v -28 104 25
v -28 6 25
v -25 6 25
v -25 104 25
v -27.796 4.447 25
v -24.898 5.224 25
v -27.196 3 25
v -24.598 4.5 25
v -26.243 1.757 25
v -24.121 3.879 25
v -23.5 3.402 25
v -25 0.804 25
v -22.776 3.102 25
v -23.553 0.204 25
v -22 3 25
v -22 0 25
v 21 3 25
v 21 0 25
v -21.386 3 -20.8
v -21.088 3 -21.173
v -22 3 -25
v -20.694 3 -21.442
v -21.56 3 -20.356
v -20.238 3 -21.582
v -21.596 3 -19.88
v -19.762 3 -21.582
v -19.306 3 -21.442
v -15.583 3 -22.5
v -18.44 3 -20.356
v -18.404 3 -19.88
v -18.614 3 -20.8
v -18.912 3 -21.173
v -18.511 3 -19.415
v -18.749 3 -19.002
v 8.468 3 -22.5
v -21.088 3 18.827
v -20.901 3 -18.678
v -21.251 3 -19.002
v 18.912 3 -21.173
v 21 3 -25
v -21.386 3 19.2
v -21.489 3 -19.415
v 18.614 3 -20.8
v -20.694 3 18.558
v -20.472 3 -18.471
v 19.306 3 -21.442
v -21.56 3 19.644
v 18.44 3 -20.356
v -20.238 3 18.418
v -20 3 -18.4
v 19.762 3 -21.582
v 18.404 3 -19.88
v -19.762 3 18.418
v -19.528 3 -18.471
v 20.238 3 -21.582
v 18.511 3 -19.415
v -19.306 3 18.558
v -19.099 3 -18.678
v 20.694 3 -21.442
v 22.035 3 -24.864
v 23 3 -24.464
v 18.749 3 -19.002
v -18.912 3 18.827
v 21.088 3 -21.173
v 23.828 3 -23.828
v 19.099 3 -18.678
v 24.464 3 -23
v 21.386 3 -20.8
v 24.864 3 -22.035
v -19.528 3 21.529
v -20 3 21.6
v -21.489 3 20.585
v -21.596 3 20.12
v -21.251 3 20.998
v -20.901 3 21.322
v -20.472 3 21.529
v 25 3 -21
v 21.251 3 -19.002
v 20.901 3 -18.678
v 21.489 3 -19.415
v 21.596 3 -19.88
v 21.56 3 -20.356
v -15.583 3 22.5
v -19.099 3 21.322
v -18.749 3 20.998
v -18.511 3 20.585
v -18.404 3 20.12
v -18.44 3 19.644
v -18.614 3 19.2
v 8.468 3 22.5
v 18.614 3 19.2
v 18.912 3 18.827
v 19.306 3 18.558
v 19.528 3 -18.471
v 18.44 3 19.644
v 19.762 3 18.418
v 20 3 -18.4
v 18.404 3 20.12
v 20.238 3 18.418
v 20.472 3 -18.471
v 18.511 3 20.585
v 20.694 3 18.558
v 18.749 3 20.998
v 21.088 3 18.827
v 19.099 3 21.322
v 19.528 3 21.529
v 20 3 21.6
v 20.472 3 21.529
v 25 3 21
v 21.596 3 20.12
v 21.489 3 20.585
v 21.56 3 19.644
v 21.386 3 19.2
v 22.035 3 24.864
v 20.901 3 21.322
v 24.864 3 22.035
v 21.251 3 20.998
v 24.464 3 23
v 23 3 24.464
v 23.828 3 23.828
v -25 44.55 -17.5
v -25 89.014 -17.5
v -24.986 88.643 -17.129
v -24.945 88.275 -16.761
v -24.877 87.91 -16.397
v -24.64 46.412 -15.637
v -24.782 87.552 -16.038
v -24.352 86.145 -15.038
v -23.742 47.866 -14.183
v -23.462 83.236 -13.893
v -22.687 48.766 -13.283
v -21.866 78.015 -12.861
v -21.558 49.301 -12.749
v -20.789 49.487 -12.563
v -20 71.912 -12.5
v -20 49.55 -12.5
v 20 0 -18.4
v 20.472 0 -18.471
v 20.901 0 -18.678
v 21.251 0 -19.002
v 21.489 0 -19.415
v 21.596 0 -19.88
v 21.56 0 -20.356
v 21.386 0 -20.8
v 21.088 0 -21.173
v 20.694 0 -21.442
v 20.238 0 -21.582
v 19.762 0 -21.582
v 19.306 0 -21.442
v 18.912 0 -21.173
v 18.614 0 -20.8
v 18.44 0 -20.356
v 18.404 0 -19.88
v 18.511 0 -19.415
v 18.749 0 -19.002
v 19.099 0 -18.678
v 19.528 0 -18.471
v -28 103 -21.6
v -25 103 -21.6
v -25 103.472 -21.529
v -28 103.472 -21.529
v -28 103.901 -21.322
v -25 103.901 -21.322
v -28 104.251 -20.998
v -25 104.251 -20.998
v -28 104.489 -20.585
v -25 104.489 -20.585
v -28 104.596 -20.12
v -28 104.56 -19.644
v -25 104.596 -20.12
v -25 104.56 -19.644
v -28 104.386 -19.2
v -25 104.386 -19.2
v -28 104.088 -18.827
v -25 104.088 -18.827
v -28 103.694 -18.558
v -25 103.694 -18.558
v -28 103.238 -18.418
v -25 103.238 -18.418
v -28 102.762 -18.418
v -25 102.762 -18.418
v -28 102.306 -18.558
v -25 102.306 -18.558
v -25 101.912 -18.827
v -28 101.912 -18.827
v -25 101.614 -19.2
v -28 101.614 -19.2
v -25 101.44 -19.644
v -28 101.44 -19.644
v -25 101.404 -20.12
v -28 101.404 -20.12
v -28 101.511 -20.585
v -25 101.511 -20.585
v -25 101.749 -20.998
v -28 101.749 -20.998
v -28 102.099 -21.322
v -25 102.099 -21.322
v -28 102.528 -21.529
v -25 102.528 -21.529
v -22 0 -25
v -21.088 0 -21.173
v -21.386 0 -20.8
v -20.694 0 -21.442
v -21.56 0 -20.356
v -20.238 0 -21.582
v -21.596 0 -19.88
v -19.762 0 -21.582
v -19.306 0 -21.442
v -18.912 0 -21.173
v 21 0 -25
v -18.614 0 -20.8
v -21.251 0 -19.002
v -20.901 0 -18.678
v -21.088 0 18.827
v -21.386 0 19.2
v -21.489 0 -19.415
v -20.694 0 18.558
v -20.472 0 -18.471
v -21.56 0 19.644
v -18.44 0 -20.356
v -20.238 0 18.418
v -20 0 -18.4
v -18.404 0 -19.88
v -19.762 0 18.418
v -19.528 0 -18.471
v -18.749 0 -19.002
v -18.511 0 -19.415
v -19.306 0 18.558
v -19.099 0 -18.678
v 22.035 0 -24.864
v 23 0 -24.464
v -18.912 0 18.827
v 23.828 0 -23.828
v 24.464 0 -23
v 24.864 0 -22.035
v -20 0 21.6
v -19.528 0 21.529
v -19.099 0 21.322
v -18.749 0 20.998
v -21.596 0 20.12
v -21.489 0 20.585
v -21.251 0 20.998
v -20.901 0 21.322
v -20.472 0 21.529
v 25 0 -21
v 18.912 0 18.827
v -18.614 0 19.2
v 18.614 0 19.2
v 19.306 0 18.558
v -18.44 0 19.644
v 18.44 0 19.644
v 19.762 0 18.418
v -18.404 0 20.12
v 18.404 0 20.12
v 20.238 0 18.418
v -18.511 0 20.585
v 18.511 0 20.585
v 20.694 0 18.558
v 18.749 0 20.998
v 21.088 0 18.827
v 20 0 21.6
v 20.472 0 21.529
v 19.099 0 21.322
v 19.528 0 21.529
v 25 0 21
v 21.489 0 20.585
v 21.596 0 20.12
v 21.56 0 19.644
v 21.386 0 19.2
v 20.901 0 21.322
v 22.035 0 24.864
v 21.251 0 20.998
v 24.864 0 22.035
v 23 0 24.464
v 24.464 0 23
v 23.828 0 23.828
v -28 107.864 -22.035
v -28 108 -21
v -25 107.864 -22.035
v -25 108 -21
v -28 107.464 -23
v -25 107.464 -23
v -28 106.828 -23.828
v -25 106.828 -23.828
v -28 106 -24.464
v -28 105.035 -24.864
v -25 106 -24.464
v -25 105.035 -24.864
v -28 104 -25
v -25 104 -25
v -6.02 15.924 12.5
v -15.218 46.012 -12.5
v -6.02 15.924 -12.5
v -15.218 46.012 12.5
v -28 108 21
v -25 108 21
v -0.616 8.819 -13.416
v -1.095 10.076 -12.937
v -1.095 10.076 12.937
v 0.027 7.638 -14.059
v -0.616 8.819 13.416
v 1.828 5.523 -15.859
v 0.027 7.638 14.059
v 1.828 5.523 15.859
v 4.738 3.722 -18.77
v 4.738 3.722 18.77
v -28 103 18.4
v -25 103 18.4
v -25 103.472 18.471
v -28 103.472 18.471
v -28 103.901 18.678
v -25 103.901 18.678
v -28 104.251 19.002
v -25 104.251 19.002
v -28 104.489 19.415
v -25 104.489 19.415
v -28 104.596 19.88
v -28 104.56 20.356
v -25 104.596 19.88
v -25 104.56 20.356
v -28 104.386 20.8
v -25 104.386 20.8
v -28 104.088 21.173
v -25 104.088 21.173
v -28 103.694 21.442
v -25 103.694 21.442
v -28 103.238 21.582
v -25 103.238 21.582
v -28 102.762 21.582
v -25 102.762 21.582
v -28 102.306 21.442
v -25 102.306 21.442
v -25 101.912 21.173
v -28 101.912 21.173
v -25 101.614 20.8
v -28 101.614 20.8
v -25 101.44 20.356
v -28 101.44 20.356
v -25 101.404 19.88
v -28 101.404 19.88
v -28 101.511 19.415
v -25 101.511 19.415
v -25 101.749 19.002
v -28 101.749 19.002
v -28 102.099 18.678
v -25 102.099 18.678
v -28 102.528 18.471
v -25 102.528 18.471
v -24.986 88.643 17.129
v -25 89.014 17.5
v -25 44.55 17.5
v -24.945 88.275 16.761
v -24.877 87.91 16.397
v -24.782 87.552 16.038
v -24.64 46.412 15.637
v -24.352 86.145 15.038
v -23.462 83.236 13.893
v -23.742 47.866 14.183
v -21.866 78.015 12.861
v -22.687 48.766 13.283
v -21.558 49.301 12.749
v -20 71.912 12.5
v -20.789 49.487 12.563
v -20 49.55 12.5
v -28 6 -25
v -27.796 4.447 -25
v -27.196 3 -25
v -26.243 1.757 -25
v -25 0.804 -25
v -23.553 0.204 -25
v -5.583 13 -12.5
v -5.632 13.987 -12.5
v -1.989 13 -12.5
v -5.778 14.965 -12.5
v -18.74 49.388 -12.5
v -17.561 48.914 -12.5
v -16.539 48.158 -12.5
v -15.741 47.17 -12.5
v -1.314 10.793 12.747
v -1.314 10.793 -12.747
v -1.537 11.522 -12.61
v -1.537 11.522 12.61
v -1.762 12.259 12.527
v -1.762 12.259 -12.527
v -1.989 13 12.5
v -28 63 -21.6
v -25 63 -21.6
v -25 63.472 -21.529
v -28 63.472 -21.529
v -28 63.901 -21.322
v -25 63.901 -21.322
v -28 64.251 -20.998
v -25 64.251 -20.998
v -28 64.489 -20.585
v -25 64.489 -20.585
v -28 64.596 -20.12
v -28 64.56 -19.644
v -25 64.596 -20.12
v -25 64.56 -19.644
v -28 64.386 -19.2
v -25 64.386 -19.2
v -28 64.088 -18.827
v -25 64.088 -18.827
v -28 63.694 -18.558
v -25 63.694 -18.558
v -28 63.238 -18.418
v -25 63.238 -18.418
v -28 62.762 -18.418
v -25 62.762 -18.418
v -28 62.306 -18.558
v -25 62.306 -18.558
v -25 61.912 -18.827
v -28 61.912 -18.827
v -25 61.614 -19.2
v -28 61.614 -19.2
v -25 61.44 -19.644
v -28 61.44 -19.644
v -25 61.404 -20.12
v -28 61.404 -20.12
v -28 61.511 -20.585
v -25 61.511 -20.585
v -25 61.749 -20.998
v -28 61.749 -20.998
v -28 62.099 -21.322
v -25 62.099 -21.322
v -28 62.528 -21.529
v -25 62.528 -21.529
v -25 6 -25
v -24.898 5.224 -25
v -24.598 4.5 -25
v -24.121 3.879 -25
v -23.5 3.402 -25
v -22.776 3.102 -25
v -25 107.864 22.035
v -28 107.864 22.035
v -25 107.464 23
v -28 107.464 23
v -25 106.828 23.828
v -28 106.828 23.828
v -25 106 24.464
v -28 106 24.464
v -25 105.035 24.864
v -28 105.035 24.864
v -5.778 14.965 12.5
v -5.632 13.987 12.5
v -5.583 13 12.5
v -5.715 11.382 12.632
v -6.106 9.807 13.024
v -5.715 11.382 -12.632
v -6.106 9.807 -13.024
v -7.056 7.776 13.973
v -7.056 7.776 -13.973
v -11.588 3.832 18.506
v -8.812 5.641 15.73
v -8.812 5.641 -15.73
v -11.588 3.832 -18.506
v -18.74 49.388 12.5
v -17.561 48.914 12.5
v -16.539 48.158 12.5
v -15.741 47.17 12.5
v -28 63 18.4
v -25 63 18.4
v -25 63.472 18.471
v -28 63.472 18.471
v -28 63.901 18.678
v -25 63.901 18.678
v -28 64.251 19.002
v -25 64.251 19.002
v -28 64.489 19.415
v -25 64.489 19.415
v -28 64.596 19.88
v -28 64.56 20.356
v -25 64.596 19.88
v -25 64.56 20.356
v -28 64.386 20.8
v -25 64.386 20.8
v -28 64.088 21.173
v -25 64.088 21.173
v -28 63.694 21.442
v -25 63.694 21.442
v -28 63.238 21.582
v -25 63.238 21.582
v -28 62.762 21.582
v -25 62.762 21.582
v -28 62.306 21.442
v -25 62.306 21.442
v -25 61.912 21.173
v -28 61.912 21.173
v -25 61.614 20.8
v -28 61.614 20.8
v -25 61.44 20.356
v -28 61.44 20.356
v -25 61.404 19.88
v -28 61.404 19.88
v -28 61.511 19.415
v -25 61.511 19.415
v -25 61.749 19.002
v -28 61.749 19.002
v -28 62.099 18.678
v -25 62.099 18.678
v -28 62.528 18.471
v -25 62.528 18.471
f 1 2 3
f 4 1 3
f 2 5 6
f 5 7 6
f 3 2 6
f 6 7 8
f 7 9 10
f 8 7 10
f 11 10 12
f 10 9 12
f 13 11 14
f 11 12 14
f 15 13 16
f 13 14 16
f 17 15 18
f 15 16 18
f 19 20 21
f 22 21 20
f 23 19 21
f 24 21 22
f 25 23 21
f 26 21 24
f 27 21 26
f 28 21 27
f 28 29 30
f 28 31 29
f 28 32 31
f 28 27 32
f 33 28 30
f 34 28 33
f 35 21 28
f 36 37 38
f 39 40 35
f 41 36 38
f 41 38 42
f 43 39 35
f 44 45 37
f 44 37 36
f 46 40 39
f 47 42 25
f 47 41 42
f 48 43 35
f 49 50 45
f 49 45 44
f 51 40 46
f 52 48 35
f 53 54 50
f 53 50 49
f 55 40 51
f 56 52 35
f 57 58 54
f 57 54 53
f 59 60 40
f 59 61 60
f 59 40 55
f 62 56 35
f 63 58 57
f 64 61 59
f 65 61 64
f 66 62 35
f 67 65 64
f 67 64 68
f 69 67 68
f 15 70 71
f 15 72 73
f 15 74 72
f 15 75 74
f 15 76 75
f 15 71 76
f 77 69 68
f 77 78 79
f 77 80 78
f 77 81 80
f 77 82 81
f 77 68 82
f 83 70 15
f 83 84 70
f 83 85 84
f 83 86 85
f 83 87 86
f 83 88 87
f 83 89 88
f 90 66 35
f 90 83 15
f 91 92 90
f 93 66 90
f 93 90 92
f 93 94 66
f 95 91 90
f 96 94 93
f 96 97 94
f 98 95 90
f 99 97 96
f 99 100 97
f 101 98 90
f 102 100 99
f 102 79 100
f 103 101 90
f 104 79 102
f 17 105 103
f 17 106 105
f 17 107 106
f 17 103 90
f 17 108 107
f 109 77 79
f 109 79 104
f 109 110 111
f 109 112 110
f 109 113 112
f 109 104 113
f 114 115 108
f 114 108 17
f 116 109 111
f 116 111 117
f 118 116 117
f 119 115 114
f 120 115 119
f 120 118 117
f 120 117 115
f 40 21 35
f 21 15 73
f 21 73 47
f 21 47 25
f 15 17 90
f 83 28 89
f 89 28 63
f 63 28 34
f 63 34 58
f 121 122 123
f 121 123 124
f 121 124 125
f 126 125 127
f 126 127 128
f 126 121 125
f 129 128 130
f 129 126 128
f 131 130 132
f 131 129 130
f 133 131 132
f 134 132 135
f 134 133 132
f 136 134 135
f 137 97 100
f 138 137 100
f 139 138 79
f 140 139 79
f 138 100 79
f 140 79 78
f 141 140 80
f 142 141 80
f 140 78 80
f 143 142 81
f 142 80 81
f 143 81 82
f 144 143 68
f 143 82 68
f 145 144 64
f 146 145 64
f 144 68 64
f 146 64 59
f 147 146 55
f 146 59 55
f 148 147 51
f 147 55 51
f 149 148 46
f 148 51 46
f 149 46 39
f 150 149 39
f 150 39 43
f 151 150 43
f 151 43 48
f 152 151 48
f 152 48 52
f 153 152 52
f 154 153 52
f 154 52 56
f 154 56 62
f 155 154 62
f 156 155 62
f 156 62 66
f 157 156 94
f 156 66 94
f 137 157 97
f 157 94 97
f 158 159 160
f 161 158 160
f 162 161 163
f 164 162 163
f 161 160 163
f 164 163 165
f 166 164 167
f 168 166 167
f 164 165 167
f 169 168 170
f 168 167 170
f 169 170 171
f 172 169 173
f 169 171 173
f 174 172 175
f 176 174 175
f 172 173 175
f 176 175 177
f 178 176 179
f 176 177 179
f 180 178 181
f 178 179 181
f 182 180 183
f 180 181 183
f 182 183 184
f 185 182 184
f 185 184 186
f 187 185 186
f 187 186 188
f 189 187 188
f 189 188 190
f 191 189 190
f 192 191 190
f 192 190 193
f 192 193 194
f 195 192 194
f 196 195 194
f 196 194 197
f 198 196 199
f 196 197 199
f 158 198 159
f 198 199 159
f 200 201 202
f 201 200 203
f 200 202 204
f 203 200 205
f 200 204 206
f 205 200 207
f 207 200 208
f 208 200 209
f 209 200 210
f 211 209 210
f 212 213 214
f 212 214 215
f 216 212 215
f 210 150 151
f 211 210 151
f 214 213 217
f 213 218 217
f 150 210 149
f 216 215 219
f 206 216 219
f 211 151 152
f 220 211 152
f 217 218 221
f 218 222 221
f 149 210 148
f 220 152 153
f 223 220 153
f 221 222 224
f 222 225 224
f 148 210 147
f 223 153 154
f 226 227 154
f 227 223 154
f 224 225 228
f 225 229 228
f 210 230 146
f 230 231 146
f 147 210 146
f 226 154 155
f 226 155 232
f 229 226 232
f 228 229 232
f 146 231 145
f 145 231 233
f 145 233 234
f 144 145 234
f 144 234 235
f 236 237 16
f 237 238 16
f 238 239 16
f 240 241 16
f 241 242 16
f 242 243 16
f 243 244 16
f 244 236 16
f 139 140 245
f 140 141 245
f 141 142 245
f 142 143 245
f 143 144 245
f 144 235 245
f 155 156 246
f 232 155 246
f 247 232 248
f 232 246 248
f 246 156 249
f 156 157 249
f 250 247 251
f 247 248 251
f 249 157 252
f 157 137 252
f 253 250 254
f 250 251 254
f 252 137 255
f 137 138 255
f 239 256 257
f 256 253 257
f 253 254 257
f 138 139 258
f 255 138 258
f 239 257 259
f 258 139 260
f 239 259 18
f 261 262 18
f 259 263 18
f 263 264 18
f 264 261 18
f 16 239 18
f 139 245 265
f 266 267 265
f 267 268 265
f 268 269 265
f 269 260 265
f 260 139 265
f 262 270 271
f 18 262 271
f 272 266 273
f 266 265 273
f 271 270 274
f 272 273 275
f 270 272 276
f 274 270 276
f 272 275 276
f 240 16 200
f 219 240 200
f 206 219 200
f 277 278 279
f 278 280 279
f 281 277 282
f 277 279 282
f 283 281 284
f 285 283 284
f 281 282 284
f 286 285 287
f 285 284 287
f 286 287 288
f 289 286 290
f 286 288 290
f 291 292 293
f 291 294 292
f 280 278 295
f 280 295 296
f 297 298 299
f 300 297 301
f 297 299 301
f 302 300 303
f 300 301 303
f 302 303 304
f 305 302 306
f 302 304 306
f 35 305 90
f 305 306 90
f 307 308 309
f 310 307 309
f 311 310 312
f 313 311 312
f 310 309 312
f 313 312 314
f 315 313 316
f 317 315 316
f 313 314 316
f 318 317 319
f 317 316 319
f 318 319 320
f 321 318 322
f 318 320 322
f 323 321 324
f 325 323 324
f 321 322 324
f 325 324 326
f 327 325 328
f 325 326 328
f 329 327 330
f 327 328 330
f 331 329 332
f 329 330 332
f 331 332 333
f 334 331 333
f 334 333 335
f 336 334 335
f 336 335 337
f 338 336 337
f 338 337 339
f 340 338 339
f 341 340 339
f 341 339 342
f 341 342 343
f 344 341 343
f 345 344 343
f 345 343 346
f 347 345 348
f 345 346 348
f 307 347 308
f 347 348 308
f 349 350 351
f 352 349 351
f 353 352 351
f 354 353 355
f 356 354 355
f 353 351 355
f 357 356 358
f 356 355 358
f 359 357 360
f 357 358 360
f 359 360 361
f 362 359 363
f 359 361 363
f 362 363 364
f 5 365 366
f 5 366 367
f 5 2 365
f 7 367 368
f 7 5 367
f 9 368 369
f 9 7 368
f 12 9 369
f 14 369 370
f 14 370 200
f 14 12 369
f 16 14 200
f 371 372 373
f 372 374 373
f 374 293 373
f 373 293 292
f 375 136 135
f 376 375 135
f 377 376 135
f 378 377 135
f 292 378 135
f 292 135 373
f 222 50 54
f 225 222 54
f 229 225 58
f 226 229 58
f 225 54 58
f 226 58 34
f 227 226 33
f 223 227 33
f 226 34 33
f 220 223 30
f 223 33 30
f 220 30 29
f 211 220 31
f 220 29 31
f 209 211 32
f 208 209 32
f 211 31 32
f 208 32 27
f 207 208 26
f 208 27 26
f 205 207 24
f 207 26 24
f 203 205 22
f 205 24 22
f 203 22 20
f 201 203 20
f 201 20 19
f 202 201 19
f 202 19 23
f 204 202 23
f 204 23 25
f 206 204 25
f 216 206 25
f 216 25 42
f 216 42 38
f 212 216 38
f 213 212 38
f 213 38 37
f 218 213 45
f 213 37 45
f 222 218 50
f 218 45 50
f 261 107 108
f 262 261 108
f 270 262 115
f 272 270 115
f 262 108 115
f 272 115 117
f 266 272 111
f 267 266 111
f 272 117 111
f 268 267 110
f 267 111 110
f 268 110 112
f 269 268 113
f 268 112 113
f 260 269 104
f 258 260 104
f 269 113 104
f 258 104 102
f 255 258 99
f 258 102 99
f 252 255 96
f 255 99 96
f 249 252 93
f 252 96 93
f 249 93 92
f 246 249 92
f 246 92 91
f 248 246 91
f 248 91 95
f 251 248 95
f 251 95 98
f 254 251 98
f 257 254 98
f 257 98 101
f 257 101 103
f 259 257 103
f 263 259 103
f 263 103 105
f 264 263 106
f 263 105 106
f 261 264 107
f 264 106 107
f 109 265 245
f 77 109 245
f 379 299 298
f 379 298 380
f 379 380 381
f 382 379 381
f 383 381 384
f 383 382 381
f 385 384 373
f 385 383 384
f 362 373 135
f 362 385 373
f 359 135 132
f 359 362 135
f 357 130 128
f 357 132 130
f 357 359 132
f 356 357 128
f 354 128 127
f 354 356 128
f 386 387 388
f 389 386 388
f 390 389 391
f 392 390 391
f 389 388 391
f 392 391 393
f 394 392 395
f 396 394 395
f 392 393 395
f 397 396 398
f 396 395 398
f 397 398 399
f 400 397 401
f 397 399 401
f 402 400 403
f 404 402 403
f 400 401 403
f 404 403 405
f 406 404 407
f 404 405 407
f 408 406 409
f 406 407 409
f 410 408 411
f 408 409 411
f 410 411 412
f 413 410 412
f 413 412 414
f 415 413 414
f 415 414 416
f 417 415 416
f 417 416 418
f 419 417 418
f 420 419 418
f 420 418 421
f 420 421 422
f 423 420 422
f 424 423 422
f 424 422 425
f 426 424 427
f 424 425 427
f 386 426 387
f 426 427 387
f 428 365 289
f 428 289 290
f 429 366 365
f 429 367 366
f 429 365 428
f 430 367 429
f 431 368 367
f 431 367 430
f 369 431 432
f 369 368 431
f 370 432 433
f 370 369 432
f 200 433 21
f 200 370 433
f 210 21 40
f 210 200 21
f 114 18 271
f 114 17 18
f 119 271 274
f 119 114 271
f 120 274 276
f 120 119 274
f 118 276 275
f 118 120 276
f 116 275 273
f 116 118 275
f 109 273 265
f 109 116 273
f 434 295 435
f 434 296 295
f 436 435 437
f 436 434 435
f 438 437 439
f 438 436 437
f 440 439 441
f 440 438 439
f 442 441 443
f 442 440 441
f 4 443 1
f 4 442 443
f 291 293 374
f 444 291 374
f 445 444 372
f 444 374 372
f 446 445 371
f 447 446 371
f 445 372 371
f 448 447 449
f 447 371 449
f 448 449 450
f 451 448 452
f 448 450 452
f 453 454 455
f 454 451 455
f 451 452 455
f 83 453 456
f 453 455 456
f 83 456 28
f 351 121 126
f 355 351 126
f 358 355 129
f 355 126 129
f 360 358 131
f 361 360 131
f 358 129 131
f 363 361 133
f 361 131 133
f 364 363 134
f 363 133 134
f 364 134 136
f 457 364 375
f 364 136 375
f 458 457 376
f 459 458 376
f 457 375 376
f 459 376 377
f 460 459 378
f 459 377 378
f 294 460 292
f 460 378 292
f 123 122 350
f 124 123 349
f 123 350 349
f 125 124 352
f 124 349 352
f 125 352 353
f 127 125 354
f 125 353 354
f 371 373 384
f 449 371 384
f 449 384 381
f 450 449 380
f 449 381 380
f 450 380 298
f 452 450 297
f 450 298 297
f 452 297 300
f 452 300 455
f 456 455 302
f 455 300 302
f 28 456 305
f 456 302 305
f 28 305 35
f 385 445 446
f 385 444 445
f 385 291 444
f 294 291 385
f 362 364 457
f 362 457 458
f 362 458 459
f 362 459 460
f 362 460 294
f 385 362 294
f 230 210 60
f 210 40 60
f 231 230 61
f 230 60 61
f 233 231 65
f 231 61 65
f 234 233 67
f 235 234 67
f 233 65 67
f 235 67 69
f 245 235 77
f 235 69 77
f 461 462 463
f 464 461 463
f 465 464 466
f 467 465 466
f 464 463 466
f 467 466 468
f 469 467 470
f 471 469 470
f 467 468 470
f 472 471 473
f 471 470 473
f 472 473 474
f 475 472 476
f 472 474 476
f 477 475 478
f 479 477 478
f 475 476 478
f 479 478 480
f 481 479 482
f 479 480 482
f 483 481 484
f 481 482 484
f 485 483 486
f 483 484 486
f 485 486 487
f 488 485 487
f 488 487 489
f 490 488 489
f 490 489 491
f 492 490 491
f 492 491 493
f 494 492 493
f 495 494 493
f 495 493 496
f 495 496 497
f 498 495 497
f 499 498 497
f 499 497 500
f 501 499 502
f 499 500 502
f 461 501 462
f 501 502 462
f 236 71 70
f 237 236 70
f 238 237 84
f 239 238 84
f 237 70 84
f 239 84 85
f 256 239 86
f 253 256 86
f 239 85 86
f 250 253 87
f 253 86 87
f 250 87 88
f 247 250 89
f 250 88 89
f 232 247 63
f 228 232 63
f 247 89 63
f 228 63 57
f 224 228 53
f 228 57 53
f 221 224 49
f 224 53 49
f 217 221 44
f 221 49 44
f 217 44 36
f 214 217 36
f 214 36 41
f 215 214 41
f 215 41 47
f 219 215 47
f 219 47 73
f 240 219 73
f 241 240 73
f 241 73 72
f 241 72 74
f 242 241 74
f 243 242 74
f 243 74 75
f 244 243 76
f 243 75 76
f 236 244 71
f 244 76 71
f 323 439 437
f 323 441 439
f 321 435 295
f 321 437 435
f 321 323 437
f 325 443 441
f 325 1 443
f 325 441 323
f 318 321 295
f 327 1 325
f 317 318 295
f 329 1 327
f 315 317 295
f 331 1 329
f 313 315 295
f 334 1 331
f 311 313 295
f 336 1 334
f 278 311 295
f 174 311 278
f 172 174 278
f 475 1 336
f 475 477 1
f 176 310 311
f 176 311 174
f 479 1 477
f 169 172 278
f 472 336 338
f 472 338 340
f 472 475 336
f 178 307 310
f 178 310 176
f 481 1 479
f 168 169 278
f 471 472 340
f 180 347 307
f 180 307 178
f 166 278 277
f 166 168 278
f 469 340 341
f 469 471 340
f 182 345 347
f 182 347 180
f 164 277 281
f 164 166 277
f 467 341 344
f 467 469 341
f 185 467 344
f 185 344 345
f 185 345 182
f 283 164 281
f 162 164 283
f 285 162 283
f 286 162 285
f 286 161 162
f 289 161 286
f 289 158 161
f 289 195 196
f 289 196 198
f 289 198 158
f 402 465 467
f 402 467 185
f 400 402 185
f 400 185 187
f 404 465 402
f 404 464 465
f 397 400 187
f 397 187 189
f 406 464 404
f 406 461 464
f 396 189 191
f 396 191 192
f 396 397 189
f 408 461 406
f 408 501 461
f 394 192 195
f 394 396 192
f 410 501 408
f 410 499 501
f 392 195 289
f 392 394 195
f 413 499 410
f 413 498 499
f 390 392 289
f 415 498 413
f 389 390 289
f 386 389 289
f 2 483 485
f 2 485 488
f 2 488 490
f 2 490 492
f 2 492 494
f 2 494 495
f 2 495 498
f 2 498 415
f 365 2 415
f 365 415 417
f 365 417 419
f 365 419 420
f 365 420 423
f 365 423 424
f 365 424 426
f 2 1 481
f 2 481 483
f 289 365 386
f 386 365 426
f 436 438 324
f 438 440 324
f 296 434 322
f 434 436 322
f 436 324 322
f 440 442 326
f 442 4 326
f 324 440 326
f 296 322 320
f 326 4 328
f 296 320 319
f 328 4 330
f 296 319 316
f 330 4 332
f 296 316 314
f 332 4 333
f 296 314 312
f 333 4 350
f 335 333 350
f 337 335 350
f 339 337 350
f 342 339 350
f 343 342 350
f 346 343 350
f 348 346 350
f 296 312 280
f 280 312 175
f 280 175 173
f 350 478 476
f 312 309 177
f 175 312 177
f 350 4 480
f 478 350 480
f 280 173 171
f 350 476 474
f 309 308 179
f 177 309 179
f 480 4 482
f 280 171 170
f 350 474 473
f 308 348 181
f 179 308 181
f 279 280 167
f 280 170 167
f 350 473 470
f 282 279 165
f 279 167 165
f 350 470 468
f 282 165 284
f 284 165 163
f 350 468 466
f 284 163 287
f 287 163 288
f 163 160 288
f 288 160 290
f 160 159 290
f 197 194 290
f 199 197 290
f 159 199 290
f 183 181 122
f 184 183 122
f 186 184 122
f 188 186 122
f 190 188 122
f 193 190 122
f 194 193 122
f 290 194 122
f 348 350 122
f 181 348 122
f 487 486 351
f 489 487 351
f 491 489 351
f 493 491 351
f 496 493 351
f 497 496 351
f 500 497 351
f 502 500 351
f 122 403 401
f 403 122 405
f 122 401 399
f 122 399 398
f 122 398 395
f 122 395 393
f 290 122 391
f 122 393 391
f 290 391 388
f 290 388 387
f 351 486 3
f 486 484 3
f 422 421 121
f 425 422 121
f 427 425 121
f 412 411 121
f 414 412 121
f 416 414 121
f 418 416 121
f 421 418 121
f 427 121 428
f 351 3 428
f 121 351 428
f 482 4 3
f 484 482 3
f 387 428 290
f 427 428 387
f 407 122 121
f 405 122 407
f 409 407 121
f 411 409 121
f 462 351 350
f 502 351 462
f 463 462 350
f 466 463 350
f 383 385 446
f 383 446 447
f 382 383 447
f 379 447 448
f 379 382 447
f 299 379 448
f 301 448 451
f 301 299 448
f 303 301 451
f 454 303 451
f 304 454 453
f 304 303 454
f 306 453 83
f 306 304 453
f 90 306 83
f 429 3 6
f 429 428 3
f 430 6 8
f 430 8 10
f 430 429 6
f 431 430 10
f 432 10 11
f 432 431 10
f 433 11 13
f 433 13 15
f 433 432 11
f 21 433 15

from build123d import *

# Parameters (mm, degrees)
SKETCH2_W           = 50
SKETCH2_H           = 50
BOSS_EXTRUDE1_DEPTH = 3
SKETCH3_R           = 1.6
CUT_EXTRUDE1_DEPTH  = 3
FILLET1_R           = 4
SKETCH4_W           = 50
SKETCH4_H           = 3
BOSS_EXTRUDE2_DEPTH = 3
SKETCH5_W           = 3
SKETCH5_H           = 50
BOSS_EXTRUDE3_DEPTH = 55
SKETCH6_W           = 3
SKETCH6_H           = 50
BOSS_EXTRUDE4_DEPTH = 50
SKETCH7_R           = 1.6
CUT_EXTRUDE2_DEPTH  = 3
FILLET2_R           = 4
FILLET3_R           = 3
FILLET4_R           = 6
BOSS_EXTRUDE5_DEPTH = 12.5
FILLET5_R           = 5
FILLET6_R           = 10


with BuildPart() as part:
    # Sketch2 → Boss-Extrude1 (new body)
    with BuildSketch(Plane(origin=(0, 0, 0), x_dir=(1, 0, 0), z_dir=(0, 1, 0))):
        Rectangle(SKETCH2_W, SKETCH2_H)
    extrude(amount=BOSS_EXTRUDE1_DEPTH)

    # Sketch3 → Cut-Extrude1 (cut)
    with BuildSketch(Plane(origin=(0, 3, 0), x_dir=(1, 0, 0), z_dir=(0, 1, 0))):
        with Locations(Location((-20, 20, 0), (0, 0, 270))):
            Circle(SKETCH3_R)
        with Locations(Location((20, 20, 0), (0, 0, 270))):
            Circle(SKETCH3_R)
        with Locations(Location((-20, -20, 0), (0, 0, 270))):
            Circle(SKETCH3_R)
        with Locations(Location((20, -20, 0), (0, 0, 270))):
            Circle(SKETCH3_R)
    extrude(amount=-CUT_EXTRUDE1_DEPTH, mode=Mode.SUBTRACT)

    # Fillet1
    fillet1_edges = [part.edges().sort_by_distance(p)[0] for p in [
        (25, 1.5, 25),
        (25, 1.5, -25),
    ]]
    fillet(fillet1_edges, radius=FILLET1_R)

    # Sketch4 → Boss-Extrude2 (add)
    with BuildSketch(Plane.ZY.offset(25)):
        with Locations((0, 1.5)):
            Rectangle(SKETCH4_W, SKETCH4_H)
    extrude(amount=BOSS_EXTRUDE2_DEPTH)

    # Sketch5 → Boss-Extrude3 (add)
    with BuildSketch(Plane(origin=(0, 3, 0), x_dir=(1, 0, 0), z_dir=(0, 1, 0))):
        with Locations((-26.5, 0)):
            Rectangle(SKETCH5_W, SKETCH5_H)
    extrude(amount=BOSS_EXTRUDE3_DEPTH)

    # Sketch6 → Boss-Extrude4 (add)
    with BuildSketch(Plane(origin=(0, 58, 0), x_dir=(1, 0, 0), z_dir=(0, 1, 0))):
        with Locations((-26.5, 0)):
            Rectangle(SKETCH6_W, SKETCH6_H)
    extrude(amount=BOSS_EXTRUDE4_DEPTH)

    # Sketch7 → Cut-Extrude2 (cut)
    with BuildSketch(Plane(origin=(-25, 0, 0), x_dir=(0, 0, -1), z_dir=(1, 0, 0))):
        with Locations((-20, 63)):
            Circle(SKETCH7_R)
        with Locations((-20, 103)):
            Circle(SKETCH7_R)
        with Locations((20, 103)):
            Circle(SKETCH7_R)
        with Locations((20, 63)):
            Circle(SKETCH7_R)
    extrude(amount=-CUT_EXTRUDE2_DEPTH, mode=Mode.SUBTRACT)

    # Fillet2
    fillet2_edges = [part.edges().sort_by_distance(p)[0] for p in [
        (-26.5, 108, 25),
        (-26.5, 108, -25),
    ]]
    fillet(fillet2_edges, radius=FILLET2_R)

    # Fillet3
    fillet3_edges = [part.edges().sort_by_distance(p)[0] for p in [
        (-25, 3, 0),
    ]]
    fillet(fillet3_edges, radius=FILLET3_R)

    # Fillet4
    fillet4_edges = [part.edges().sort_by_distance(p)[0] for p in [
        (-28, 0, 0),
    ]]
    fillet(fillet4_edges, radius=FILLET4_R)

    # Sketch8 → Boss-Extrude5 (add, symmetric)
    with BuildSketch(Plane.XY):
        Polygon((-2.068537635, 3), (1.068537635, 3), (-25, 88.266344583), (-25, 78.005433723), align=None)
    extrude(amount=BOSS_EXTRUDE5_DEPTH, both=True)

    # Fillet5
    fillet5_edges = [part.edges().sort_by_distance(p)[0] for p in [
        (-25, 83.135889153, -12.5),
        (-25, 88.266344583, 0),
        (-25, 78.005433723, 0),
        (-25, 83.135889153, 12.5),
    ]]
    fillet(fillet5_edges, radius=FILLET5_R)

    # Fillet6
    fillet6_edges = [part.edges().sort_by_distance(p)[0] for p in [
        (1.068537635, 3, 0),
        (-0.5, 3, -12.5),
        (-2.068537635, 3, 0),
        (-0.5, 3, 12.5),
    ]]
    fillet(fillet6_edges, radius=FILLET6_R)


solid = part.part
